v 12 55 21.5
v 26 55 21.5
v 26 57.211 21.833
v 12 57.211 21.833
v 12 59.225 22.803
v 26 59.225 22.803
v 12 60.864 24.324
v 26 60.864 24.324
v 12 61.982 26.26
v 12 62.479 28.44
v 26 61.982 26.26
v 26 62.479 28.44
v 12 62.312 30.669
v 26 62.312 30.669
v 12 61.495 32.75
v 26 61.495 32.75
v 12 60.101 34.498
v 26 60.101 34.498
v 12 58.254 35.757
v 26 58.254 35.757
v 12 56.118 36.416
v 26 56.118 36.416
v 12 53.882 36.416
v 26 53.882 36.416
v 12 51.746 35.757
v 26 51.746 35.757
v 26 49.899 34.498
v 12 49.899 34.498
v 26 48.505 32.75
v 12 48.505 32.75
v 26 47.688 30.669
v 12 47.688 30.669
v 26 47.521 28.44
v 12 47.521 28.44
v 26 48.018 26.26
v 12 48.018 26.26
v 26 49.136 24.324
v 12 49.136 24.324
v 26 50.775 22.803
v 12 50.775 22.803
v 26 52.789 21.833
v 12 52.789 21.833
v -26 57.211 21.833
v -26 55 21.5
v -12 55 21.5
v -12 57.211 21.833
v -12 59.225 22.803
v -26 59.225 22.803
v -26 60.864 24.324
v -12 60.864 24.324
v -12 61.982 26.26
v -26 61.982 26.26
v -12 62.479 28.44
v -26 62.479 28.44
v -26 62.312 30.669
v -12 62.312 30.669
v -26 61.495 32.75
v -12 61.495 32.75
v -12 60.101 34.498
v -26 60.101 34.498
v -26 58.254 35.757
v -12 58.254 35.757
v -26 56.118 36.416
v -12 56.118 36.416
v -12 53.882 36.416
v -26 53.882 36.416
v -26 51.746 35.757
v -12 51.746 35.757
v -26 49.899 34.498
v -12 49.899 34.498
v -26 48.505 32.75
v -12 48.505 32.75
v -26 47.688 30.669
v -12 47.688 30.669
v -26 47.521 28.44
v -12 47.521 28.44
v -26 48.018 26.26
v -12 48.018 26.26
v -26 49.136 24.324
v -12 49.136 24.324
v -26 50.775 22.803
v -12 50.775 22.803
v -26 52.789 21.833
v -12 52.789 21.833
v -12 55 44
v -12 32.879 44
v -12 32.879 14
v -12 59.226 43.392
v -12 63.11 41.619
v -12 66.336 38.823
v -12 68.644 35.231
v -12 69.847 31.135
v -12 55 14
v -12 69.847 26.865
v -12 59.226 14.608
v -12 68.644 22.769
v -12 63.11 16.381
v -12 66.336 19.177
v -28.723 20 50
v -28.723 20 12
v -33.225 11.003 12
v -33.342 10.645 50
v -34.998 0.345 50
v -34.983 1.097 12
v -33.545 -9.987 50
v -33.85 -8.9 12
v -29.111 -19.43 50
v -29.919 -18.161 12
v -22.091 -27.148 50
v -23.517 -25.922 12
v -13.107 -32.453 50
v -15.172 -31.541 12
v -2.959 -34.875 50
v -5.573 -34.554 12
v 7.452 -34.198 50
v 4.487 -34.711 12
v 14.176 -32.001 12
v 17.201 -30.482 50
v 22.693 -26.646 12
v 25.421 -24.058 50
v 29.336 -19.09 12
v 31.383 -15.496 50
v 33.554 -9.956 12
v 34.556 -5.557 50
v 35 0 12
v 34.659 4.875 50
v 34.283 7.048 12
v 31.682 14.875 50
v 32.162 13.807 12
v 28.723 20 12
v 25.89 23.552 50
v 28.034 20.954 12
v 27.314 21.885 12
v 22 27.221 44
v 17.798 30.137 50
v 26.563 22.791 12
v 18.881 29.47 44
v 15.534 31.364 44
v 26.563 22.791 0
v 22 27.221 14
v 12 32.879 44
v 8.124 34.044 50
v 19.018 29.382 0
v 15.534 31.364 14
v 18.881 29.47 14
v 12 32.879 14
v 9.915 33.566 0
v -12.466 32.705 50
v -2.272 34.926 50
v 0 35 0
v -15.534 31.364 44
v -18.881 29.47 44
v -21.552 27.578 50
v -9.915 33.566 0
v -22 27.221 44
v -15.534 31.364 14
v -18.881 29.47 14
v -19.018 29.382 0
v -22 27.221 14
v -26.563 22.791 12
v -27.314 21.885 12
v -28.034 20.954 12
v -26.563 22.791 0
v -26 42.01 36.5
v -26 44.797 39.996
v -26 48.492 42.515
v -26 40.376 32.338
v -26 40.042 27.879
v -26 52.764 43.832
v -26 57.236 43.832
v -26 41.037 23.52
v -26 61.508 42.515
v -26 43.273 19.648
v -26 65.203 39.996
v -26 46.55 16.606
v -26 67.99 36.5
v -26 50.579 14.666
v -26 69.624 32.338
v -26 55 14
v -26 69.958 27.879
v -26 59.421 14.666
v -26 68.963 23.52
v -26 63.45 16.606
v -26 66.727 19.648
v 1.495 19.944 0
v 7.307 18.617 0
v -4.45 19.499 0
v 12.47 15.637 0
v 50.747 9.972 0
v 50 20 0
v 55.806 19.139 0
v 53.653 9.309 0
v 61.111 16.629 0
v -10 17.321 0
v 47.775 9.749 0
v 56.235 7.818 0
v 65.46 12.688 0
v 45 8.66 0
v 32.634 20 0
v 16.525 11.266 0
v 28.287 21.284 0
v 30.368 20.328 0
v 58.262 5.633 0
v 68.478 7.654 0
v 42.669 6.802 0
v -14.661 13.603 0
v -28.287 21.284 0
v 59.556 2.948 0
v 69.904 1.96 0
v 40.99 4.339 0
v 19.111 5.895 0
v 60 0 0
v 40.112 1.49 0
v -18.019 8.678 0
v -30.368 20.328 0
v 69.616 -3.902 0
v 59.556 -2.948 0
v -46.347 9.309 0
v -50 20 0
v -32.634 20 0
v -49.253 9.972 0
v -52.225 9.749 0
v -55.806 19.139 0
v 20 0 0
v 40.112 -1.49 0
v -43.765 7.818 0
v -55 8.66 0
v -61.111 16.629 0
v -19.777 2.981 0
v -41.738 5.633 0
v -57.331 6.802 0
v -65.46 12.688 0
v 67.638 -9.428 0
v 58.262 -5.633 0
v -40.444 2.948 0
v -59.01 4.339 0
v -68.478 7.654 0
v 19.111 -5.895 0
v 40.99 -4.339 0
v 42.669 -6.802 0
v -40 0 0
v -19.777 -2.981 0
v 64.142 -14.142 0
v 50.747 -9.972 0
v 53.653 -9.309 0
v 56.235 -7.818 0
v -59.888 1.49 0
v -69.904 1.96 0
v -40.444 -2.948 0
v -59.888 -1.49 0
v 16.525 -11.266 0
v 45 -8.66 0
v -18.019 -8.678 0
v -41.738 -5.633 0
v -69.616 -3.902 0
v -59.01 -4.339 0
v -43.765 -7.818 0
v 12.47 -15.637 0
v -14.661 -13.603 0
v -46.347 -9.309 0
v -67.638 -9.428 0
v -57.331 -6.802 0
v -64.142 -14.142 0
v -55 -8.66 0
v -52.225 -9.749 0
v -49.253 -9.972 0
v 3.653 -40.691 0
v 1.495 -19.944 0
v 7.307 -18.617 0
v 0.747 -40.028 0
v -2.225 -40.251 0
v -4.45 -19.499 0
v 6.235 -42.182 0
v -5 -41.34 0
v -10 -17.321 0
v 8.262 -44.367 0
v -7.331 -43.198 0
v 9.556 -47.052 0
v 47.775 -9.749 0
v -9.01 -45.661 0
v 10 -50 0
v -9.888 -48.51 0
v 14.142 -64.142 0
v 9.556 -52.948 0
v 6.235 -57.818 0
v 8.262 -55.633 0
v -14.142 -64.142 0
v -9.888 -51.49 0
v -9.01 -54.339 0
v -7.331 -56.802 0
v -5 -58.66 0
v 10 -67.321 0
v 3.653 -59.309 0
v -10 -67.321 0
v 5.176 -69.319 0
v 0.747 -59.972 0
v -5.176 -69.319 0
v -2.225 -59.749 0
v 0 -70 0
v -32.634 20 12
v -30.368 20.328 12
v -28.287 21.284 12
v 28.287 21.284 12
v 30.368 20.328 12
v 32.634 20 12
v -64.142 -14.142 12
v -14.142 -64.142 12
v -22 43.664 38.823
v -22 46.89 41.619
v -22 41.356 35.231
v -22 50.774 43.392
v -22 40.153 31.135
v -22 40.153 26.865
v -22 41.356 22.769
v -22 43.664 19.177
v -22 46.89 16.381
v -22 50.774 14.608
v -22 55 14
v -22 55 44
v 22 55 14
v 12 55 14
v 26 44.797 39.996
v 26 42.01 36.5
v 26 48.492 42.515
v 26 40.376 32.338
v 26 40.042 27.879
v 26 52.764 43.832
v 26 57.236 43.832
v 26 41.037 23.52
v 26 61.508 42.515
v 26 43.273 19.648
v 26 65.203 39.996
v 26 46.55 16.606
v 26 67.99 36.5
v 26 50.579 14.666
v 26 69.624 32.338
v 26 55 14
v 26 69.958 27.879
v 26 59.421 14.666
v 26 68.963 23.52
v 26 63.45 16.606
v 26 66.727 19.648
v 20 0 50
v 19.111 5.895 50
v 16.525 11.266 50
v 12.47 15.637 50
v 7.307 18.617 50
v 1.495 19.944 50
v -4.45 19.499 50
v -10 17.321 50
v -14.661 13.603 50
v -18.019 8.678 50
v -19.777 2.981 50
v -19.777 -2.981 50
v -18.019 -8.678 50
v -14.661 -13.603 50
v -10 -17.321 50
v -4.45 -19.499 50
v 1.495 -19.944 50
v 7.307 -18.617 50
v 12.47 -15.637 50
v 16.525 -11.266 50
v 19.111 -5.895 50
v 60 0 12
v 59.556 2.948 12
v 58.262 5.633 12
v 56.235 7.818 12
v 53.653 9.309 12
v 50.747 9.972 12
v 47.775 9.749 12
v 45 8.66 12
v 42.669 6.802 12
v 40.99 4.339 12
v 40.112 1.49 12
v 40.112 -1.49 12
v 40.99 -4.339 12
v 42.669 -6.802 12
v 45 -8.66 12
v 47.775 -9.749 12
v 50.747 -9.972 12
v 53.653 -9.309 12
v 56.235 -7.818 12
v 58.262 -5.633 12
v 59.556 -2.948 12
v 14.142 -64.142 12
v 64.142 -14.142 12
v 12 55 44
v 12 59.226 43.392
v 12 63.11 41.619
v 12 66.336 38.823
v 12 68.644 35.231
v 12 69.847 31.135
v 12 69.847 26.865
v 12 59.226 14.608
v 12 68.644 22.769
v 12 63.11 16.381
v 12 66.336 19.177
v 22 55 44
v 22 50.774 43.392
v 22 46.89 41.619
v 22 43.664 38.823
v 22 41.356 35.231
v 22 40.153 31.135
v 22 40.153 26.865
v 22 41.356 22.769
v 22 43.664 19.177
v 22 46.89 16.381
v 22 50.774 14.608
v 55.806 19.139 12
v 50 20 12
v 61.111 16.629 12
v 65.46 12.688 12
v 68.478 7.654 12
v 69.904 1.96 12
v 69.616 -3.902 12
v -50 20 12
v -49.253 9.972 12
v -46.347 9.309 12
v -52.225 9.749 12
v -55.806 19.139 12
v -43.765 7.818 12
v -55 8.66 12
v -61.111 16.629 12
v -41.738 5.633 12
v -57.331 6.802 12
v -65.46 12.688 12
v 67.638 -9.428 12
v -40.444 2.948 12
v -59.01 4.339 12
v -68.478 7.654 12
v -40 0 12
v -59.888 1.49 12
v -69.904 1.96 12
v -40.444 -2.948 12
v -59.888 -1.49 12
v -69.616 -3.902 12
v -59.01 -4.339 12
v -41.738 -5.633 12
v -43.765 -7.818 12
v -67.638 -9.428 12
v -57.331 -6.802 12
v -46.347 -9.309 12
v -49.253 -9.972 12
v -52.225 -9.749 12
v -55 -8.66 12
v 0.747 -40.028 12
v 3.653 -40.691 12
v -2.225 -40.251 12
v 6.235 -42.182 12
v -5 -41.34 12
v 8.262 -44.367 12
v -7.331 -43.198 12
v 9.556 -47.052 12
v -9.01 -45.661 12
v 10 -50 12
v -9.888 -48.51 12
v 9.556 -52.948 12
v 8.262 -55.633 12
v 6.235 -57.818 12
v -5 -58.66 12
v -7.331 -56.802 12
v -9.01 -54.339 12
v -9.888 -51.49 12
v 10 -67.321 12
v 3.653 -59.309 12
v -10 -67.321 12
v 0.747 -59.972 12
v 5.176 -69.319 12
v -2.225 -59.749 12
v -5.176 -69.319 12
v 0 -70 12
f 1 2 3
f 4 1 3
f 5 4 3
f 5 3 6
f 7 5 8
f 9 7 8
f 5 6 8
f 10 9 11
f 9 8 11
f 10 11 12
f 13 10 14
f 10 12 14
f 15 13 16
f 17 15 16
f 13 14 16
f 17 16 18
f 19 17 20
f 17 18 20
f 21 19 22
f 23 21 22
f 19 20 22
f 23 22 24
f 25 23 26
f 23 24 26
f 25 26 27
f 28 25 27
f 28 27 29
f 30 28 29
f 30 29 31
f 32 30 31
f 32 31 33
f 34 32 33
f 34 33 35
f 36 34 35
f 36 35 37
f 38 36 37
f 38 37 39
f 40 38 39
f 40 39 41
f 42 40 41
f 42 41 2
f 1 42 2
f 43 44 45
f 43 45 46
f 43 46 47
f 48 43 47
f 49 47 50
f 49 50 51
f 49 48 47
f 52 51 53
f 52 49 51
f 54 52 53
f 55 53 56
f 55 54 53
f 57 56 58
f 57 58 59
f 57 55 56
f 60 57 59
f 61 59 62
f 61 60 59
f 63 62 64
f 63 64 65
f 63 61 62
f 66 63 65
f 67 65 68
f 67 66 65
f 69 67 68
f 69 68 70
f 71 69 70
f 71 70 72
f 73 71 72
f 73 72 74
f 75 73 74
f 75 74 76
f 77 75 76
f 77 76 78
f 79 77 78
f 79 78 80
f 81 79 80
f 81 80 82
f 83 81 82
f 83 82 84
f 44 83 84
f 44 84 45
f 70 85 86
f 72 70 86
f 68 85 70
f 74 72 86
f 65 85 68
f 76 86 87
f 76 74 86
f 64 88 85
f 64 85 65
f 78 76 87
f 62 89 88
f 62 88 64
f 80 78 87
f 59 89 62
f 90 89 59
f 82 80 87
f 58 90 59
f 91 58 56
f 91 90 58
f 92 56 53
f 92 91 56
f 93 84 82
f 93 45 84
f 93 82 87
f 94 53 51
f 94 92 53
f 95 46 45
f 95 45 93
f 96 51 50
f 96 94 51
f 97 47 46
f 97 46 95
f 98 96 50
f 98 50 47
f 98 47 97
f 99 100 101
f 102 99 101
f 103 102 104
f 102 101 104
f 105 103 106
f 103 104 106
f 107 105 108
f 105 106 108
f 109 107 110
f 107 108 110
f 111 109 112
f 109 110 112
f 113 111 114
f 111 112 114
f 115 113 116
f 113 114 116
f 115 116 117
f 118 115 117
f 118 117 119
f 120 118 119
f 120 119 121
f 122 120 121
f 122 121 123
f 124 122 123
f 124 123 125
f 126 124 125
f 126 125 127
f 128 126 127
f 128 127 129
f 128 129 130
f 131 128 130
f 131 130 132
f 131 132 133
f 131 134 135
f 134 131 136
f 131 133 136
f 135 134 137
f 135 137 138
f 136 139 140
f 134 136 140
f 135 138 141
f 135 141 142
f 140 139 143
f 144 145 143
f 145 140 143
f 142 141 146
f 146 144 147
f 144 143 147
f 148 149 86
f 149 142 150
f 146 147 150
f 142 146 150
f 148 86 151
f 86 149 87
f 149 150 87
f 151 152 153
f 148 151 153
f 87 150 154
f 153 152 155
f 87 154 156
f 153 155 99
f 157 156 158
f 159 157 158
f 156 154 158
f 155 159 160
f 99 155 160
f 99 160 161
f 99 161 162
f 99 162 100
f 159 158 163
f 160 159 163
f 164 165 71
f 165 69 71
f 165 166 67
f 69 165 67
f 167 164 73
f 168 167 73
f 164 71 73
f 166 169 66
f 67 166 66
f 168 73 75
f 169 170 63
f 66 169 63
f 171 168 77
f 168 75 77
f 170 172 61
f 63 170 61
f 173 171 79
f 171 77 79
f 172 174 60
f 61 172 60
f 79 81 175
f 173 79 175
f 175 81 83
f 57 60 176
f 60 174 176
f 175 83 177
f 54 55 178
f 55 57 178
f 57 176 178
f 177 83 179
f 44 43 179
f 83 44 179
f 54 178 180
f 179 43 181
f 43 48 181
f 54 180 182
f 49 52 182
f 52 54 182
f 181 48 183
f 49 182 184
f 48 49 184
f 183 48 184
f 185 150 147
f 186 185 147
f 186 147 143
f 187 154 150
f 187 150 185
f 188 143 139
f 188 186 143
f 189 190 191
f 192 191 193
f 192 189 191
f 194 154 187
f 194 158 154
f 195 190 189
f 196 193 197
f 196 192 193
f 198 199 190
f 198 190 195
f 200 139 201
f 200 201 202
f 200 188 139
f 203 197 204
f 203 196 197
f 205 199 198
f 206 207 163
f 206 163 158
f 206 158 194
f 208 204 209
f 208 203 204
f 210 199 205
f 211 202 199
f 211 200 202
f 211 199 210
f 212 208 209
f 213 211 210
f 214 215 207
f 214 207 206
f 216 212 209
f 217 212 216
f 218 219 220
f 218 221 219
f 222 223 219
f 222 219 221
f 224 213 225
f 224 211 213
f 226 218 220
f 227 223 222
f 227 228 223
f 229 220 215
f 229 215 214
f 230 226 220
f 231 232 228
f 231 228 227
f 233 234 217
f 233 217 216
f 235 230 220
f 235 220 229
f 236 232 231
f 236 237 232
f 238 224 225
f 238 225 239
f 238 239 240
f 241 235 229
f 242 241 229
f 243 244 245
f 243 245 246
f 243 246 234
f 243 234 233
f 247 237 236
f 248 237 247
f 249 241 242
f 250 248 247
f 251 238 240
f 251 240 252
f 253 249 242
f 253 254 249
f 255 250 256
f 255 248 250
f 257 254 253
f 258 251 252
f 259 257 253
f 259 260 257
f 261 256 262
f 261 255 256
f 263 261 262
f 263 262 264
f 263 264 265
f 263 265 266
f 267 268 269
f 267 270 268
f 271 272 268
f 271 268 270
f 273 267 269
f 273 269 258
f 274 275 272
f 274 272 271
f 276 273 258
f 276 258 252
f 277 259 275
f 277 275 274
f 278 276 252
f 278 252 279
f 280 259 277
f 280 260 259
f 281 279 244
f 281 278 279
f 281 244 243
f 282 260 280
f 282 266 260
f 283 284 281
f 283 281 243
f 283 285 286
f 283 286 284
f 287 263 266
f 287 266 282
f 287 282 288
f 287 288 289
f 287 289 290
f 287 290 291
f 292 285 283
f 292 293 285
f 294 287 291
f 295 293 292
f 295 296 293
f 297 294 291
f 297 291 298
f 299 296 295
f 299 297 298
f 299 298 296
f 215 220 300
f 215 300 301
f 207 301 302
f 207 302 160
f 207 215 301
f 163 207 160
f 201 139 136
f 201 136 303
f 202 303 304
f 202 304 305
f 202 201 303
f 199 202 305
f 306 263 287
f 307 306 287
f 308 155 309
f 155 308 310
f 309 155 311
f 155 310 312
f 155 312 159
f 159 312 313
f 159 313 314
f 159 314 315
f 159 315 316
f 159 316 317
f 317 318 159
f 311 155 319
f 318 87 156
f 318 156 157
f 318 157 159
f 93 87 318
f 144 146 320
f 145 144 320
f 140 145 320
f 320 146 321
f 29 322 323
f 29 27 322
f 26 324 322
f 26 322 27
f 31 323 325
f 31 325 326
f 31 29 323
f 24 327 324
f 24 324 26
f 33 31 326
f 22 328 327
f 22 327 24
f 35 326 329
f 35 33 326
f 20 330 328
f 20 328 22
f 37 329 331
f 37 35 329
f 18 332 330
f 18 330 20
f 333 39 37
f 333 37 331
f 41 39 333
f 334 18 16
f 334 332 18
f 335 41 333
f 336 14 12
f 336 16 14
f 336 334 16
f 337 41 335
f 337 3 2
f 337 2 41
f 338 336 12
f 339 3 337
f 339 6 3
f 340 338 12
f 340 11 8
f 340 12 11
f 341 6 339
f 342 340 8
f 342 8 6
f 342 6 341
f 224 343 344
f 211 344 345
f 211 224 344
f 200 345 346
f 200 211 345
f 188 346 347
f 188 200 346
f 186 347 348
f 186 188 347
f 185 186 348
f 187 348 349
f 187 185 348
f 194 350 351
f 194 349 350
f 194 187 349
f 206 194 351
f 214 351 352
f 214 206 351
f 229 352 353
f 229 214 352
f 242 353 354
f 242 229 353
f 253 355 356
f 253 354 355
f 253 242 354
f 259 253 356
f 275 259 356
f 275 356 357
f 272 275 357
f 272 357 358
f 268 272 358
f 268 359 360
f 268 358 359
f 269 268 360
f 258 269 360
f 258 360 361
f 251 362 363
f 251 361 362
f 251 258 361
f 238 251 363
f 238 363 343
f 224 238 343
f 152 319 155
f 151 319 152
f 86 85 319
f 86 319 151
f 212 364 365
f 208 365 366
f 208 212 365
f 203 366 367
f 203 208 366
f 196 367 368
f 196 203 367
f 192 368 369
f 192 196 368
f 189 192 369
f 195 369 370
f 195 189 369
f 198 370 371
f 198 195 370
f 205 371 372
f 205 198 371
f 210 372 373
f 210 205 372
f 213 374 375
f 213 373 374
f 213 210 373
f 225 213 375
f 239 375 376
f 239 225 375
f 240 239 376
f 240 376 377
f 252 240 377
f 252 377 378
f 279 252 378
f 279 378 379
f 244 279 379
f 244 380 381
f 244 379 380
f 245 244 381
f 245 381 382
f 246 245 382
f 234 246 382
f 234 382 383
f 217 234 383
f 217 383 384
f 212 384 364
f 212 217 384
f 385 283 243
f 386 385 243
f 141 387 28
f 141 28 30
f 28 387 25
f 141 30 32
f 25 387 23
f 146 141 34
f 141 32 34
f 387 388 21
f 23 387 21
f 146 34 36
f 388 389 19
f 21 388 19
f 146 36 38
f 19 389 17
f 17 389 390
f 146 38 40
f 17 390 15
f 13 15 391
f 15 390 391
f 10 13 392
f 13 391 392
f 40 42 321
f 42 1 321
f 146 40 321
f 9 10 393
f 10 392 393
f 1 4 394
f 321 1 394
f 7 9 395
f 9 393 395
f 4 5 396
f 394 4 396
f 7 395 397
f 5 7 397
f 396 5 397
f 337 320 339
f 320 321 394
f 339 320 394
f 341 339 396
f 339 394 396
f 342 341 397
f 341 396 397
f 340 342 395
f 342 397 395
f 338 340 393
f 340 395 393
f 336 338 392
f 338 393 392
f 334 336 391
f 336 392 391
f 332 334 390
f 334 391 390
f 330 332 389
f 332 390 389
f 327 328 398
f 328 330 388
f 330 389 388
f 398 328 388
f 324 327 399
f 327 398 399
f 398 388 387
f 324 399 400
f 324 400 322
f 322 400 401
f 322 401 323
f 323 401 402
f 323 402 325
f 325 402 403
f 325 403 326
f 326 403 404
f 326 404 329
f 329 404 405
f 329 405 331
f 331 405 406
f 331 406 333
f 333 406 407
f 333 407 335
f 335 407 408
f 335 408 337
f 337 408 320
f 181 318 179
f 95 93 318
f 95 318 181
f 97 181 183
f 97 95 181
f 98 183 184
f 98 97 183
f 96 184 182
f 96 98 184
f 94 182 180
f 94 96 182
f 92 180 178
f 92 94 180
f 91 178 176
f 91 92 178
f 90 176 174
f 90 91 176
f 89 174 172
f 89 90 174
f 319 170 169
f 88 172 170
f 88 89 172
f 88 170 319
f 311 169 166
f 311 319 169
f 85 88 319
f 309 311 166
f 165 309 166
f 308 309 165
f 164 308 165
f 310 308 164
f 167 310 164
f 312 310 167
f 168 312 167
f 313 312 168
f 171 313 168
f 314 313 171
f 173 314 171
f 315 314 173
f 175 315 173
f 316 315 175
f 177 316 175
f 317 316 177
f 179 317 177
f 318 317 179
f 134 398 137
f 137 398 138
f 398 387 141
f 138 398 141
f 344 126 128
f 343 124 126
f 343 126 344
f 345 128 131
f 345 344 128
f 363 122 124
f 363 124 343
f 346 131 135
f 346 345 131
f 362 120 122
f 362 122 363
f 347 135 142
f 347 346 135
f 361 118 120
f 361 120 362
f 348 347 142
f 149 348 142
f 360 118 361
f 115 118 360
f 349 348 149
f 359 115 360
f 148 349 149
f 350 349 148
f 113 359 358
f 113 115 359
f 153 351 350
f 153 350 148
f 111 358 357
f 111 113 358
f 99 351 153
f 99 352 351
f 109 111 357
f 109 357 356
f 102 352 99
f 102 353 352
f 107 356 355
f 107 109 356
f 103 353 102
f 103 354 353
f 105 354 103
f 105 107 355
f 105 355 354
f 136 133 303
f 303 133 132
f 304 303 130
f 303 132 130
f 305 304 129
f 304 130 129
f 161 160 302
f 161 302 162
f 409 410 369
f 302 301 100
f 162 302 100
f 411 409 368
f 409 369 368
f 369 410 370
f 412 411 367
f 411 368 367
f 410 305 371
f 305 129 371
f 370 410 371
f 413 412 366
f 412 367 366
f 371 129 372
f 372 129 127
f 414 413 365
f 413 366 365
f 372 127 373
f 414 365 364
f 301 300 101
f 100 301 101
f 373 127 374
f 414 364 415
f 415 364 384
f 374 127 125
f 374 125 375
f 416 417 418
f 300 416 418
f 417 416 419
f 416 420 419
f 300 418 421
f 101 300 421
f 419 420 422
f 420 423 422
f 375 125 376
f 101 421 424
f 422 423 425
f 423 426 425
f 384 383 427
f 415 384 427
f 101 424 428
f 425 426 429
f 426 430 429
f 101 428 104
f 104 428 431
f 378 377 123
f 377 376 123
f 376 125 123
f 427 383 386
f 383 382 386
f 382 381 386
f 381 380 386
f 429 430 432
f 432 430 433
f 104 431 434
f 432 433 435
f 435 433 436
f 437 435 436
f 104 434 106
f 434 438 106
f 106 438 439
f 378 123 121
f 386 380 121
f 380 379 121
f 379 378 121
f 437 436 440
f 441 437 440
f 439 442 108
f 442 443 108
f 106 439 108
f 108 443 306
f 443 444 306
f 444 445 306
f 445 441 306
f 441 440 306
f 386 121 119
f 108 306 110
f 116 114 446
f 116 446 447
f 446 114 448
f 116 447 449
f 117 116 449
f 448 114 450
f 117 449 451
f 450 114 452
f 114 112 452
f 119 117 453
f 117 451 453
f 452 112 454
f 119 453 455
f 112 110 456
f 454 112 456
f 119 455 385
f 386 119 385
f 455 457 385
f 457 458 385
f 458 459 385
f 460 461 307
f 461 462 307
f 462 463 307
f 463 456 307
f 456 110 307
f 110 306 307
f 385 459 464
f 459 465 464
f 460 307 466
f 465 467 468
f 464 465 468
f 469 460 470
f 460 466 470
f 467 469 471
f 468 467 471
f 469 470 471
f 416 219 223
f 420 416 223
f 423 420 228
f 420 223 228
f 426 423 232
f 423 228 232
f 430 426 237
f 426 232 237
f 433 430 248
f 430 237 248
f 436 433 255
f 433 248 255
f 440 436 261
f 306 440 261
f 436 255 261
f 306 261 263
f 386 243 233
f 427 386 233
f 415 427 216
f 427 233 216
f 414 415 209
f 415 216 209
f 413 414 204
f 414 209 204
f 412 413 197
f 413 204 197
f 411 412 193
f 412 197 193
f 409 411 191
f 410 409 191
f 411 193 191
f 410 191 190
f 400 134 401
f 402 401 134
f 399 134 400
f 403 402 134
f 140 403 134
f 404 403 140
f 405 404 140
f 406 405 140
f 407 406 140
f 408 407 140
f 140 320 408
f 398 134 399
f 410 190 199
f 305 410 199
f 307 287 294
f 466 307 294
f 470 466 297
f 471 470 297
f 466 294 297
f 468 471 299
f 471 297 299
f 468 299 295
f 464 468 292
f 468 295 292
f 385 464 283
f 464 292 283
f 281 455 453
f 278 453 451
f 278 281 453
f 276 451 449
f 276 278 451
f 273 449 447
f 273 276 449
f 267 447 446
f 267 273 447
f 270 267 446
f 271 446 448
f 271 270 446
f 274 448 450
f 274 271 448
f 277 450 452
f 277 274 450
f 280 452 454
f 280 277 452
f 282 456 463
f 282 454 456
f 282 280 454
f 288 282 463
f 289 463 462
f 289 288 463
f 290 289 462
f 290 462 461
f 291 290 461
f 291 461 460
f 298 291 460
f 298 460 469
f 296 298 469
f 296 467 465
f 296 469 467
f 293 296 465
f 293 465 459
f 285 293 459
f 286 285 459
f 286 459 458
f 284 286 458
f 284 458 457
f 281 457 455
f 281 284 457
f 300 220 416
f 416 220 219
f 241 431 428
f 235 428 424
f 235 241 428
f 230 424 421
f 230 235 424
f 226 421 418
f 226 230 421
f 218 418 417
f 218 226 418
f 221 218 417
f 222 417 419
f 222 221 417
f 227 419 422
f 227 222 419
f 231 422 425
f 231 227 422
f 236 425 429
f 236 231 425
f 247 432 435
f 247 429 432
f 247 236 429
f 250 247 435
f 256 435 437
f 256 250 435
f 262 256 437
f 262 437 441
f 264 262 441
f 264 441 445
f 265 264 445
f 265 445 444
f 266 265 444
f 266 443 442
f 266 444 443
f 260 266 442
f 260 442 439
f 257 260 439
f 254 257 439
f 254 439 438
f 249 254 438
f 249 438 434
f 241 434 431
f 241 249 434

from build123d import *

# Parameters (mm, degrees)
SKETCH1_R                = 10
BOSS_EXTRUDE1_DEPTH      = 12
SKETCH1_3_R              = 35
SKETCH1_3_R_2            = 20
BOSS_EXTRUDE2_DEPTH      = 50
BOSS_EXTRUDE3_START      = 12
BOSS_EXTRUDE3_DEPTH      = 10
BOSS_EXTRUDE4_DEPTH      = 4
BOSS_EXTRUDE4_DEPTH_BACK = 10
SKETCH5_R                = 15
SKETCH6_R                = 7.5
CUT_EXTRUDE1_DEPTH       = 129.903064355
FILLET1_R                = 8


with BuildPart() as part:
    # Sketch1 → Boss-Extrude1 (new body)
    with BuildSketch(Plane.XY):
        with BuildLine():
            Line((50, 20), (28.722813233, 20))
            ThreePointArc((28.722813233, 20), (33.393850206, 10.480971731), (35, 0))
            ThreePointArc((35, 0), (-10.480971731, -33.393850206), (-28.722813233, 20))
            Line((-28.722813233, 20), (-50, 20))
            ThreePointArc((-50, 20), (-68.47759065, 7.653668647), (-64.142135624, -14.142135624))
            Line((-64.142135624, -14.142135624), (-14.142135624, -64.142135624))
            ThreePointArc((-14.142135624, -64.142135624), (0, -70), (14.142135624, -64.142135624))
            Line((14.142135624, -64.142135624), (64.142135624, -14.142135624))
            ThreePointArc((64.142135624, -14.142135624), (68.47759065, 7.653668647), (50, 20))
        make_face()
        with Locations((0, -50)):
            Circle(SKETCH1_R, mode=Mode.SUBTRACT)
        with Locations((-50, 0)):
            Circle(SKETCH1_R, mode=Mode.SUBTRACT)
        with Locations((50, 0)):
            Circle(SKETCH1_R, mode=Mode.SUBTRACT)
    extrude(amount=BOSS_EXTRUDE1_DEPTH)

    # Sketch1<3> → Boss-Extrude2 (add)
    with BuildSketch(Plane.XY):
        with Locations(Location((0, 0, 0), (0, 0, 145.150095421))):
            Circle(SKETCH1_3_R)
        Circle(SKETCH1_3_R_2, mode=Mode.SUBTRACT)
    extrude(amount=BOSS_EXTRUDE2_DEPTH)

    # Sketch4 → Boss-Extrude3 (add)
    with BuildSketch(Plane(origin=(0, 0, 0), x_dir=(0, 0, -1), z_dir=(1, 0, 0)).offset(BOSS_EXTRUDE3_START)):
        Polygon((-14, 55), (-44, 55), (-44, 35), (-44, 20), (-14, 20), align=None)
    extrude(amount=BOSS_EXTRUDE3_DEPTH)

    # Sketch5 → Boss-Extrude4 (add, two sides: drawn at the far end of the back side and taken through both)
    with BuildSketch(Plane(origin=(22, 0, 0), x_dir=(0, 0, -1), z_dir=(1, 0, 0)).offset(-BOSS_EXTRUDE4_DEPTH_BACK)):
        with Locations((-29, 55)):
            Circle(SKETCH5_R)
    extrude(amount=BOSS_EXTRUDE4_DEPTH + BOSS_EXTRUDE4_DEPTH_BACK)

    # Sketch6 → Cut-Extrude1 (cut, through all)
    with BuildSketch(Plane(origin=(26, 0, 0), x_dir=(0, 0, -1), z_dir=(1, 0, 0))):
        with Locations((-29, 55)):
            Circle(SKETCH6_R)
    extrude(amount=-CUT_EXTRUDE1_DEPTH, mode=Mode.SUBTRACT)

    # Mirror1: part across plane


with BuildPart() as part_1:
    add(part.part)
    add(part.part.mirror(Plane(origin=(0, 0, 0), x_dir=(0, 0, 1), z_dir=(1, 0, 0))))

    # Fillet1
    # the kernel refuses this fillet: 8 mm, written as the material it adds along each edge
    with BuildSketch(Plane(origin=(-28.722813233, 20, 0), x_dir=(-1, 0, 0), z_dir=(0, 0, 1))) as fillet1_piece_1:
        with BuildLine():
            CenterArc((3.911524511, -8), FILLET1_R, 90, 49.370671217)
            ThreePointArc((-2.159980185, -2.790697674), (-1.044795429, -1.422589257), (0, 0))
            Line((0, 0), (3.911524511, 0))
        make_face()
    extrude(amount=12)
    with BuildSketch(Plane(origin=(28.722813233, 20, 0), x_dir=(-0.6120739787659375, 0.7908005086731007, 0), z_dir=(0, 0, 1))) as fillet1_piece_2:
        with BuildLine():
            CenterArc((3.932261699, -7.989827403), FILLET1_R, 92.889712102, 49.370671217)
            Line((-2.394142371, -3.093235573), (0, 0))
            ThreePointArc((0, 0), (1.764476403, -0.04450511), (3.528952806, 0))
        make_face()
    extrude(amount=12)


solid = part_1.part
